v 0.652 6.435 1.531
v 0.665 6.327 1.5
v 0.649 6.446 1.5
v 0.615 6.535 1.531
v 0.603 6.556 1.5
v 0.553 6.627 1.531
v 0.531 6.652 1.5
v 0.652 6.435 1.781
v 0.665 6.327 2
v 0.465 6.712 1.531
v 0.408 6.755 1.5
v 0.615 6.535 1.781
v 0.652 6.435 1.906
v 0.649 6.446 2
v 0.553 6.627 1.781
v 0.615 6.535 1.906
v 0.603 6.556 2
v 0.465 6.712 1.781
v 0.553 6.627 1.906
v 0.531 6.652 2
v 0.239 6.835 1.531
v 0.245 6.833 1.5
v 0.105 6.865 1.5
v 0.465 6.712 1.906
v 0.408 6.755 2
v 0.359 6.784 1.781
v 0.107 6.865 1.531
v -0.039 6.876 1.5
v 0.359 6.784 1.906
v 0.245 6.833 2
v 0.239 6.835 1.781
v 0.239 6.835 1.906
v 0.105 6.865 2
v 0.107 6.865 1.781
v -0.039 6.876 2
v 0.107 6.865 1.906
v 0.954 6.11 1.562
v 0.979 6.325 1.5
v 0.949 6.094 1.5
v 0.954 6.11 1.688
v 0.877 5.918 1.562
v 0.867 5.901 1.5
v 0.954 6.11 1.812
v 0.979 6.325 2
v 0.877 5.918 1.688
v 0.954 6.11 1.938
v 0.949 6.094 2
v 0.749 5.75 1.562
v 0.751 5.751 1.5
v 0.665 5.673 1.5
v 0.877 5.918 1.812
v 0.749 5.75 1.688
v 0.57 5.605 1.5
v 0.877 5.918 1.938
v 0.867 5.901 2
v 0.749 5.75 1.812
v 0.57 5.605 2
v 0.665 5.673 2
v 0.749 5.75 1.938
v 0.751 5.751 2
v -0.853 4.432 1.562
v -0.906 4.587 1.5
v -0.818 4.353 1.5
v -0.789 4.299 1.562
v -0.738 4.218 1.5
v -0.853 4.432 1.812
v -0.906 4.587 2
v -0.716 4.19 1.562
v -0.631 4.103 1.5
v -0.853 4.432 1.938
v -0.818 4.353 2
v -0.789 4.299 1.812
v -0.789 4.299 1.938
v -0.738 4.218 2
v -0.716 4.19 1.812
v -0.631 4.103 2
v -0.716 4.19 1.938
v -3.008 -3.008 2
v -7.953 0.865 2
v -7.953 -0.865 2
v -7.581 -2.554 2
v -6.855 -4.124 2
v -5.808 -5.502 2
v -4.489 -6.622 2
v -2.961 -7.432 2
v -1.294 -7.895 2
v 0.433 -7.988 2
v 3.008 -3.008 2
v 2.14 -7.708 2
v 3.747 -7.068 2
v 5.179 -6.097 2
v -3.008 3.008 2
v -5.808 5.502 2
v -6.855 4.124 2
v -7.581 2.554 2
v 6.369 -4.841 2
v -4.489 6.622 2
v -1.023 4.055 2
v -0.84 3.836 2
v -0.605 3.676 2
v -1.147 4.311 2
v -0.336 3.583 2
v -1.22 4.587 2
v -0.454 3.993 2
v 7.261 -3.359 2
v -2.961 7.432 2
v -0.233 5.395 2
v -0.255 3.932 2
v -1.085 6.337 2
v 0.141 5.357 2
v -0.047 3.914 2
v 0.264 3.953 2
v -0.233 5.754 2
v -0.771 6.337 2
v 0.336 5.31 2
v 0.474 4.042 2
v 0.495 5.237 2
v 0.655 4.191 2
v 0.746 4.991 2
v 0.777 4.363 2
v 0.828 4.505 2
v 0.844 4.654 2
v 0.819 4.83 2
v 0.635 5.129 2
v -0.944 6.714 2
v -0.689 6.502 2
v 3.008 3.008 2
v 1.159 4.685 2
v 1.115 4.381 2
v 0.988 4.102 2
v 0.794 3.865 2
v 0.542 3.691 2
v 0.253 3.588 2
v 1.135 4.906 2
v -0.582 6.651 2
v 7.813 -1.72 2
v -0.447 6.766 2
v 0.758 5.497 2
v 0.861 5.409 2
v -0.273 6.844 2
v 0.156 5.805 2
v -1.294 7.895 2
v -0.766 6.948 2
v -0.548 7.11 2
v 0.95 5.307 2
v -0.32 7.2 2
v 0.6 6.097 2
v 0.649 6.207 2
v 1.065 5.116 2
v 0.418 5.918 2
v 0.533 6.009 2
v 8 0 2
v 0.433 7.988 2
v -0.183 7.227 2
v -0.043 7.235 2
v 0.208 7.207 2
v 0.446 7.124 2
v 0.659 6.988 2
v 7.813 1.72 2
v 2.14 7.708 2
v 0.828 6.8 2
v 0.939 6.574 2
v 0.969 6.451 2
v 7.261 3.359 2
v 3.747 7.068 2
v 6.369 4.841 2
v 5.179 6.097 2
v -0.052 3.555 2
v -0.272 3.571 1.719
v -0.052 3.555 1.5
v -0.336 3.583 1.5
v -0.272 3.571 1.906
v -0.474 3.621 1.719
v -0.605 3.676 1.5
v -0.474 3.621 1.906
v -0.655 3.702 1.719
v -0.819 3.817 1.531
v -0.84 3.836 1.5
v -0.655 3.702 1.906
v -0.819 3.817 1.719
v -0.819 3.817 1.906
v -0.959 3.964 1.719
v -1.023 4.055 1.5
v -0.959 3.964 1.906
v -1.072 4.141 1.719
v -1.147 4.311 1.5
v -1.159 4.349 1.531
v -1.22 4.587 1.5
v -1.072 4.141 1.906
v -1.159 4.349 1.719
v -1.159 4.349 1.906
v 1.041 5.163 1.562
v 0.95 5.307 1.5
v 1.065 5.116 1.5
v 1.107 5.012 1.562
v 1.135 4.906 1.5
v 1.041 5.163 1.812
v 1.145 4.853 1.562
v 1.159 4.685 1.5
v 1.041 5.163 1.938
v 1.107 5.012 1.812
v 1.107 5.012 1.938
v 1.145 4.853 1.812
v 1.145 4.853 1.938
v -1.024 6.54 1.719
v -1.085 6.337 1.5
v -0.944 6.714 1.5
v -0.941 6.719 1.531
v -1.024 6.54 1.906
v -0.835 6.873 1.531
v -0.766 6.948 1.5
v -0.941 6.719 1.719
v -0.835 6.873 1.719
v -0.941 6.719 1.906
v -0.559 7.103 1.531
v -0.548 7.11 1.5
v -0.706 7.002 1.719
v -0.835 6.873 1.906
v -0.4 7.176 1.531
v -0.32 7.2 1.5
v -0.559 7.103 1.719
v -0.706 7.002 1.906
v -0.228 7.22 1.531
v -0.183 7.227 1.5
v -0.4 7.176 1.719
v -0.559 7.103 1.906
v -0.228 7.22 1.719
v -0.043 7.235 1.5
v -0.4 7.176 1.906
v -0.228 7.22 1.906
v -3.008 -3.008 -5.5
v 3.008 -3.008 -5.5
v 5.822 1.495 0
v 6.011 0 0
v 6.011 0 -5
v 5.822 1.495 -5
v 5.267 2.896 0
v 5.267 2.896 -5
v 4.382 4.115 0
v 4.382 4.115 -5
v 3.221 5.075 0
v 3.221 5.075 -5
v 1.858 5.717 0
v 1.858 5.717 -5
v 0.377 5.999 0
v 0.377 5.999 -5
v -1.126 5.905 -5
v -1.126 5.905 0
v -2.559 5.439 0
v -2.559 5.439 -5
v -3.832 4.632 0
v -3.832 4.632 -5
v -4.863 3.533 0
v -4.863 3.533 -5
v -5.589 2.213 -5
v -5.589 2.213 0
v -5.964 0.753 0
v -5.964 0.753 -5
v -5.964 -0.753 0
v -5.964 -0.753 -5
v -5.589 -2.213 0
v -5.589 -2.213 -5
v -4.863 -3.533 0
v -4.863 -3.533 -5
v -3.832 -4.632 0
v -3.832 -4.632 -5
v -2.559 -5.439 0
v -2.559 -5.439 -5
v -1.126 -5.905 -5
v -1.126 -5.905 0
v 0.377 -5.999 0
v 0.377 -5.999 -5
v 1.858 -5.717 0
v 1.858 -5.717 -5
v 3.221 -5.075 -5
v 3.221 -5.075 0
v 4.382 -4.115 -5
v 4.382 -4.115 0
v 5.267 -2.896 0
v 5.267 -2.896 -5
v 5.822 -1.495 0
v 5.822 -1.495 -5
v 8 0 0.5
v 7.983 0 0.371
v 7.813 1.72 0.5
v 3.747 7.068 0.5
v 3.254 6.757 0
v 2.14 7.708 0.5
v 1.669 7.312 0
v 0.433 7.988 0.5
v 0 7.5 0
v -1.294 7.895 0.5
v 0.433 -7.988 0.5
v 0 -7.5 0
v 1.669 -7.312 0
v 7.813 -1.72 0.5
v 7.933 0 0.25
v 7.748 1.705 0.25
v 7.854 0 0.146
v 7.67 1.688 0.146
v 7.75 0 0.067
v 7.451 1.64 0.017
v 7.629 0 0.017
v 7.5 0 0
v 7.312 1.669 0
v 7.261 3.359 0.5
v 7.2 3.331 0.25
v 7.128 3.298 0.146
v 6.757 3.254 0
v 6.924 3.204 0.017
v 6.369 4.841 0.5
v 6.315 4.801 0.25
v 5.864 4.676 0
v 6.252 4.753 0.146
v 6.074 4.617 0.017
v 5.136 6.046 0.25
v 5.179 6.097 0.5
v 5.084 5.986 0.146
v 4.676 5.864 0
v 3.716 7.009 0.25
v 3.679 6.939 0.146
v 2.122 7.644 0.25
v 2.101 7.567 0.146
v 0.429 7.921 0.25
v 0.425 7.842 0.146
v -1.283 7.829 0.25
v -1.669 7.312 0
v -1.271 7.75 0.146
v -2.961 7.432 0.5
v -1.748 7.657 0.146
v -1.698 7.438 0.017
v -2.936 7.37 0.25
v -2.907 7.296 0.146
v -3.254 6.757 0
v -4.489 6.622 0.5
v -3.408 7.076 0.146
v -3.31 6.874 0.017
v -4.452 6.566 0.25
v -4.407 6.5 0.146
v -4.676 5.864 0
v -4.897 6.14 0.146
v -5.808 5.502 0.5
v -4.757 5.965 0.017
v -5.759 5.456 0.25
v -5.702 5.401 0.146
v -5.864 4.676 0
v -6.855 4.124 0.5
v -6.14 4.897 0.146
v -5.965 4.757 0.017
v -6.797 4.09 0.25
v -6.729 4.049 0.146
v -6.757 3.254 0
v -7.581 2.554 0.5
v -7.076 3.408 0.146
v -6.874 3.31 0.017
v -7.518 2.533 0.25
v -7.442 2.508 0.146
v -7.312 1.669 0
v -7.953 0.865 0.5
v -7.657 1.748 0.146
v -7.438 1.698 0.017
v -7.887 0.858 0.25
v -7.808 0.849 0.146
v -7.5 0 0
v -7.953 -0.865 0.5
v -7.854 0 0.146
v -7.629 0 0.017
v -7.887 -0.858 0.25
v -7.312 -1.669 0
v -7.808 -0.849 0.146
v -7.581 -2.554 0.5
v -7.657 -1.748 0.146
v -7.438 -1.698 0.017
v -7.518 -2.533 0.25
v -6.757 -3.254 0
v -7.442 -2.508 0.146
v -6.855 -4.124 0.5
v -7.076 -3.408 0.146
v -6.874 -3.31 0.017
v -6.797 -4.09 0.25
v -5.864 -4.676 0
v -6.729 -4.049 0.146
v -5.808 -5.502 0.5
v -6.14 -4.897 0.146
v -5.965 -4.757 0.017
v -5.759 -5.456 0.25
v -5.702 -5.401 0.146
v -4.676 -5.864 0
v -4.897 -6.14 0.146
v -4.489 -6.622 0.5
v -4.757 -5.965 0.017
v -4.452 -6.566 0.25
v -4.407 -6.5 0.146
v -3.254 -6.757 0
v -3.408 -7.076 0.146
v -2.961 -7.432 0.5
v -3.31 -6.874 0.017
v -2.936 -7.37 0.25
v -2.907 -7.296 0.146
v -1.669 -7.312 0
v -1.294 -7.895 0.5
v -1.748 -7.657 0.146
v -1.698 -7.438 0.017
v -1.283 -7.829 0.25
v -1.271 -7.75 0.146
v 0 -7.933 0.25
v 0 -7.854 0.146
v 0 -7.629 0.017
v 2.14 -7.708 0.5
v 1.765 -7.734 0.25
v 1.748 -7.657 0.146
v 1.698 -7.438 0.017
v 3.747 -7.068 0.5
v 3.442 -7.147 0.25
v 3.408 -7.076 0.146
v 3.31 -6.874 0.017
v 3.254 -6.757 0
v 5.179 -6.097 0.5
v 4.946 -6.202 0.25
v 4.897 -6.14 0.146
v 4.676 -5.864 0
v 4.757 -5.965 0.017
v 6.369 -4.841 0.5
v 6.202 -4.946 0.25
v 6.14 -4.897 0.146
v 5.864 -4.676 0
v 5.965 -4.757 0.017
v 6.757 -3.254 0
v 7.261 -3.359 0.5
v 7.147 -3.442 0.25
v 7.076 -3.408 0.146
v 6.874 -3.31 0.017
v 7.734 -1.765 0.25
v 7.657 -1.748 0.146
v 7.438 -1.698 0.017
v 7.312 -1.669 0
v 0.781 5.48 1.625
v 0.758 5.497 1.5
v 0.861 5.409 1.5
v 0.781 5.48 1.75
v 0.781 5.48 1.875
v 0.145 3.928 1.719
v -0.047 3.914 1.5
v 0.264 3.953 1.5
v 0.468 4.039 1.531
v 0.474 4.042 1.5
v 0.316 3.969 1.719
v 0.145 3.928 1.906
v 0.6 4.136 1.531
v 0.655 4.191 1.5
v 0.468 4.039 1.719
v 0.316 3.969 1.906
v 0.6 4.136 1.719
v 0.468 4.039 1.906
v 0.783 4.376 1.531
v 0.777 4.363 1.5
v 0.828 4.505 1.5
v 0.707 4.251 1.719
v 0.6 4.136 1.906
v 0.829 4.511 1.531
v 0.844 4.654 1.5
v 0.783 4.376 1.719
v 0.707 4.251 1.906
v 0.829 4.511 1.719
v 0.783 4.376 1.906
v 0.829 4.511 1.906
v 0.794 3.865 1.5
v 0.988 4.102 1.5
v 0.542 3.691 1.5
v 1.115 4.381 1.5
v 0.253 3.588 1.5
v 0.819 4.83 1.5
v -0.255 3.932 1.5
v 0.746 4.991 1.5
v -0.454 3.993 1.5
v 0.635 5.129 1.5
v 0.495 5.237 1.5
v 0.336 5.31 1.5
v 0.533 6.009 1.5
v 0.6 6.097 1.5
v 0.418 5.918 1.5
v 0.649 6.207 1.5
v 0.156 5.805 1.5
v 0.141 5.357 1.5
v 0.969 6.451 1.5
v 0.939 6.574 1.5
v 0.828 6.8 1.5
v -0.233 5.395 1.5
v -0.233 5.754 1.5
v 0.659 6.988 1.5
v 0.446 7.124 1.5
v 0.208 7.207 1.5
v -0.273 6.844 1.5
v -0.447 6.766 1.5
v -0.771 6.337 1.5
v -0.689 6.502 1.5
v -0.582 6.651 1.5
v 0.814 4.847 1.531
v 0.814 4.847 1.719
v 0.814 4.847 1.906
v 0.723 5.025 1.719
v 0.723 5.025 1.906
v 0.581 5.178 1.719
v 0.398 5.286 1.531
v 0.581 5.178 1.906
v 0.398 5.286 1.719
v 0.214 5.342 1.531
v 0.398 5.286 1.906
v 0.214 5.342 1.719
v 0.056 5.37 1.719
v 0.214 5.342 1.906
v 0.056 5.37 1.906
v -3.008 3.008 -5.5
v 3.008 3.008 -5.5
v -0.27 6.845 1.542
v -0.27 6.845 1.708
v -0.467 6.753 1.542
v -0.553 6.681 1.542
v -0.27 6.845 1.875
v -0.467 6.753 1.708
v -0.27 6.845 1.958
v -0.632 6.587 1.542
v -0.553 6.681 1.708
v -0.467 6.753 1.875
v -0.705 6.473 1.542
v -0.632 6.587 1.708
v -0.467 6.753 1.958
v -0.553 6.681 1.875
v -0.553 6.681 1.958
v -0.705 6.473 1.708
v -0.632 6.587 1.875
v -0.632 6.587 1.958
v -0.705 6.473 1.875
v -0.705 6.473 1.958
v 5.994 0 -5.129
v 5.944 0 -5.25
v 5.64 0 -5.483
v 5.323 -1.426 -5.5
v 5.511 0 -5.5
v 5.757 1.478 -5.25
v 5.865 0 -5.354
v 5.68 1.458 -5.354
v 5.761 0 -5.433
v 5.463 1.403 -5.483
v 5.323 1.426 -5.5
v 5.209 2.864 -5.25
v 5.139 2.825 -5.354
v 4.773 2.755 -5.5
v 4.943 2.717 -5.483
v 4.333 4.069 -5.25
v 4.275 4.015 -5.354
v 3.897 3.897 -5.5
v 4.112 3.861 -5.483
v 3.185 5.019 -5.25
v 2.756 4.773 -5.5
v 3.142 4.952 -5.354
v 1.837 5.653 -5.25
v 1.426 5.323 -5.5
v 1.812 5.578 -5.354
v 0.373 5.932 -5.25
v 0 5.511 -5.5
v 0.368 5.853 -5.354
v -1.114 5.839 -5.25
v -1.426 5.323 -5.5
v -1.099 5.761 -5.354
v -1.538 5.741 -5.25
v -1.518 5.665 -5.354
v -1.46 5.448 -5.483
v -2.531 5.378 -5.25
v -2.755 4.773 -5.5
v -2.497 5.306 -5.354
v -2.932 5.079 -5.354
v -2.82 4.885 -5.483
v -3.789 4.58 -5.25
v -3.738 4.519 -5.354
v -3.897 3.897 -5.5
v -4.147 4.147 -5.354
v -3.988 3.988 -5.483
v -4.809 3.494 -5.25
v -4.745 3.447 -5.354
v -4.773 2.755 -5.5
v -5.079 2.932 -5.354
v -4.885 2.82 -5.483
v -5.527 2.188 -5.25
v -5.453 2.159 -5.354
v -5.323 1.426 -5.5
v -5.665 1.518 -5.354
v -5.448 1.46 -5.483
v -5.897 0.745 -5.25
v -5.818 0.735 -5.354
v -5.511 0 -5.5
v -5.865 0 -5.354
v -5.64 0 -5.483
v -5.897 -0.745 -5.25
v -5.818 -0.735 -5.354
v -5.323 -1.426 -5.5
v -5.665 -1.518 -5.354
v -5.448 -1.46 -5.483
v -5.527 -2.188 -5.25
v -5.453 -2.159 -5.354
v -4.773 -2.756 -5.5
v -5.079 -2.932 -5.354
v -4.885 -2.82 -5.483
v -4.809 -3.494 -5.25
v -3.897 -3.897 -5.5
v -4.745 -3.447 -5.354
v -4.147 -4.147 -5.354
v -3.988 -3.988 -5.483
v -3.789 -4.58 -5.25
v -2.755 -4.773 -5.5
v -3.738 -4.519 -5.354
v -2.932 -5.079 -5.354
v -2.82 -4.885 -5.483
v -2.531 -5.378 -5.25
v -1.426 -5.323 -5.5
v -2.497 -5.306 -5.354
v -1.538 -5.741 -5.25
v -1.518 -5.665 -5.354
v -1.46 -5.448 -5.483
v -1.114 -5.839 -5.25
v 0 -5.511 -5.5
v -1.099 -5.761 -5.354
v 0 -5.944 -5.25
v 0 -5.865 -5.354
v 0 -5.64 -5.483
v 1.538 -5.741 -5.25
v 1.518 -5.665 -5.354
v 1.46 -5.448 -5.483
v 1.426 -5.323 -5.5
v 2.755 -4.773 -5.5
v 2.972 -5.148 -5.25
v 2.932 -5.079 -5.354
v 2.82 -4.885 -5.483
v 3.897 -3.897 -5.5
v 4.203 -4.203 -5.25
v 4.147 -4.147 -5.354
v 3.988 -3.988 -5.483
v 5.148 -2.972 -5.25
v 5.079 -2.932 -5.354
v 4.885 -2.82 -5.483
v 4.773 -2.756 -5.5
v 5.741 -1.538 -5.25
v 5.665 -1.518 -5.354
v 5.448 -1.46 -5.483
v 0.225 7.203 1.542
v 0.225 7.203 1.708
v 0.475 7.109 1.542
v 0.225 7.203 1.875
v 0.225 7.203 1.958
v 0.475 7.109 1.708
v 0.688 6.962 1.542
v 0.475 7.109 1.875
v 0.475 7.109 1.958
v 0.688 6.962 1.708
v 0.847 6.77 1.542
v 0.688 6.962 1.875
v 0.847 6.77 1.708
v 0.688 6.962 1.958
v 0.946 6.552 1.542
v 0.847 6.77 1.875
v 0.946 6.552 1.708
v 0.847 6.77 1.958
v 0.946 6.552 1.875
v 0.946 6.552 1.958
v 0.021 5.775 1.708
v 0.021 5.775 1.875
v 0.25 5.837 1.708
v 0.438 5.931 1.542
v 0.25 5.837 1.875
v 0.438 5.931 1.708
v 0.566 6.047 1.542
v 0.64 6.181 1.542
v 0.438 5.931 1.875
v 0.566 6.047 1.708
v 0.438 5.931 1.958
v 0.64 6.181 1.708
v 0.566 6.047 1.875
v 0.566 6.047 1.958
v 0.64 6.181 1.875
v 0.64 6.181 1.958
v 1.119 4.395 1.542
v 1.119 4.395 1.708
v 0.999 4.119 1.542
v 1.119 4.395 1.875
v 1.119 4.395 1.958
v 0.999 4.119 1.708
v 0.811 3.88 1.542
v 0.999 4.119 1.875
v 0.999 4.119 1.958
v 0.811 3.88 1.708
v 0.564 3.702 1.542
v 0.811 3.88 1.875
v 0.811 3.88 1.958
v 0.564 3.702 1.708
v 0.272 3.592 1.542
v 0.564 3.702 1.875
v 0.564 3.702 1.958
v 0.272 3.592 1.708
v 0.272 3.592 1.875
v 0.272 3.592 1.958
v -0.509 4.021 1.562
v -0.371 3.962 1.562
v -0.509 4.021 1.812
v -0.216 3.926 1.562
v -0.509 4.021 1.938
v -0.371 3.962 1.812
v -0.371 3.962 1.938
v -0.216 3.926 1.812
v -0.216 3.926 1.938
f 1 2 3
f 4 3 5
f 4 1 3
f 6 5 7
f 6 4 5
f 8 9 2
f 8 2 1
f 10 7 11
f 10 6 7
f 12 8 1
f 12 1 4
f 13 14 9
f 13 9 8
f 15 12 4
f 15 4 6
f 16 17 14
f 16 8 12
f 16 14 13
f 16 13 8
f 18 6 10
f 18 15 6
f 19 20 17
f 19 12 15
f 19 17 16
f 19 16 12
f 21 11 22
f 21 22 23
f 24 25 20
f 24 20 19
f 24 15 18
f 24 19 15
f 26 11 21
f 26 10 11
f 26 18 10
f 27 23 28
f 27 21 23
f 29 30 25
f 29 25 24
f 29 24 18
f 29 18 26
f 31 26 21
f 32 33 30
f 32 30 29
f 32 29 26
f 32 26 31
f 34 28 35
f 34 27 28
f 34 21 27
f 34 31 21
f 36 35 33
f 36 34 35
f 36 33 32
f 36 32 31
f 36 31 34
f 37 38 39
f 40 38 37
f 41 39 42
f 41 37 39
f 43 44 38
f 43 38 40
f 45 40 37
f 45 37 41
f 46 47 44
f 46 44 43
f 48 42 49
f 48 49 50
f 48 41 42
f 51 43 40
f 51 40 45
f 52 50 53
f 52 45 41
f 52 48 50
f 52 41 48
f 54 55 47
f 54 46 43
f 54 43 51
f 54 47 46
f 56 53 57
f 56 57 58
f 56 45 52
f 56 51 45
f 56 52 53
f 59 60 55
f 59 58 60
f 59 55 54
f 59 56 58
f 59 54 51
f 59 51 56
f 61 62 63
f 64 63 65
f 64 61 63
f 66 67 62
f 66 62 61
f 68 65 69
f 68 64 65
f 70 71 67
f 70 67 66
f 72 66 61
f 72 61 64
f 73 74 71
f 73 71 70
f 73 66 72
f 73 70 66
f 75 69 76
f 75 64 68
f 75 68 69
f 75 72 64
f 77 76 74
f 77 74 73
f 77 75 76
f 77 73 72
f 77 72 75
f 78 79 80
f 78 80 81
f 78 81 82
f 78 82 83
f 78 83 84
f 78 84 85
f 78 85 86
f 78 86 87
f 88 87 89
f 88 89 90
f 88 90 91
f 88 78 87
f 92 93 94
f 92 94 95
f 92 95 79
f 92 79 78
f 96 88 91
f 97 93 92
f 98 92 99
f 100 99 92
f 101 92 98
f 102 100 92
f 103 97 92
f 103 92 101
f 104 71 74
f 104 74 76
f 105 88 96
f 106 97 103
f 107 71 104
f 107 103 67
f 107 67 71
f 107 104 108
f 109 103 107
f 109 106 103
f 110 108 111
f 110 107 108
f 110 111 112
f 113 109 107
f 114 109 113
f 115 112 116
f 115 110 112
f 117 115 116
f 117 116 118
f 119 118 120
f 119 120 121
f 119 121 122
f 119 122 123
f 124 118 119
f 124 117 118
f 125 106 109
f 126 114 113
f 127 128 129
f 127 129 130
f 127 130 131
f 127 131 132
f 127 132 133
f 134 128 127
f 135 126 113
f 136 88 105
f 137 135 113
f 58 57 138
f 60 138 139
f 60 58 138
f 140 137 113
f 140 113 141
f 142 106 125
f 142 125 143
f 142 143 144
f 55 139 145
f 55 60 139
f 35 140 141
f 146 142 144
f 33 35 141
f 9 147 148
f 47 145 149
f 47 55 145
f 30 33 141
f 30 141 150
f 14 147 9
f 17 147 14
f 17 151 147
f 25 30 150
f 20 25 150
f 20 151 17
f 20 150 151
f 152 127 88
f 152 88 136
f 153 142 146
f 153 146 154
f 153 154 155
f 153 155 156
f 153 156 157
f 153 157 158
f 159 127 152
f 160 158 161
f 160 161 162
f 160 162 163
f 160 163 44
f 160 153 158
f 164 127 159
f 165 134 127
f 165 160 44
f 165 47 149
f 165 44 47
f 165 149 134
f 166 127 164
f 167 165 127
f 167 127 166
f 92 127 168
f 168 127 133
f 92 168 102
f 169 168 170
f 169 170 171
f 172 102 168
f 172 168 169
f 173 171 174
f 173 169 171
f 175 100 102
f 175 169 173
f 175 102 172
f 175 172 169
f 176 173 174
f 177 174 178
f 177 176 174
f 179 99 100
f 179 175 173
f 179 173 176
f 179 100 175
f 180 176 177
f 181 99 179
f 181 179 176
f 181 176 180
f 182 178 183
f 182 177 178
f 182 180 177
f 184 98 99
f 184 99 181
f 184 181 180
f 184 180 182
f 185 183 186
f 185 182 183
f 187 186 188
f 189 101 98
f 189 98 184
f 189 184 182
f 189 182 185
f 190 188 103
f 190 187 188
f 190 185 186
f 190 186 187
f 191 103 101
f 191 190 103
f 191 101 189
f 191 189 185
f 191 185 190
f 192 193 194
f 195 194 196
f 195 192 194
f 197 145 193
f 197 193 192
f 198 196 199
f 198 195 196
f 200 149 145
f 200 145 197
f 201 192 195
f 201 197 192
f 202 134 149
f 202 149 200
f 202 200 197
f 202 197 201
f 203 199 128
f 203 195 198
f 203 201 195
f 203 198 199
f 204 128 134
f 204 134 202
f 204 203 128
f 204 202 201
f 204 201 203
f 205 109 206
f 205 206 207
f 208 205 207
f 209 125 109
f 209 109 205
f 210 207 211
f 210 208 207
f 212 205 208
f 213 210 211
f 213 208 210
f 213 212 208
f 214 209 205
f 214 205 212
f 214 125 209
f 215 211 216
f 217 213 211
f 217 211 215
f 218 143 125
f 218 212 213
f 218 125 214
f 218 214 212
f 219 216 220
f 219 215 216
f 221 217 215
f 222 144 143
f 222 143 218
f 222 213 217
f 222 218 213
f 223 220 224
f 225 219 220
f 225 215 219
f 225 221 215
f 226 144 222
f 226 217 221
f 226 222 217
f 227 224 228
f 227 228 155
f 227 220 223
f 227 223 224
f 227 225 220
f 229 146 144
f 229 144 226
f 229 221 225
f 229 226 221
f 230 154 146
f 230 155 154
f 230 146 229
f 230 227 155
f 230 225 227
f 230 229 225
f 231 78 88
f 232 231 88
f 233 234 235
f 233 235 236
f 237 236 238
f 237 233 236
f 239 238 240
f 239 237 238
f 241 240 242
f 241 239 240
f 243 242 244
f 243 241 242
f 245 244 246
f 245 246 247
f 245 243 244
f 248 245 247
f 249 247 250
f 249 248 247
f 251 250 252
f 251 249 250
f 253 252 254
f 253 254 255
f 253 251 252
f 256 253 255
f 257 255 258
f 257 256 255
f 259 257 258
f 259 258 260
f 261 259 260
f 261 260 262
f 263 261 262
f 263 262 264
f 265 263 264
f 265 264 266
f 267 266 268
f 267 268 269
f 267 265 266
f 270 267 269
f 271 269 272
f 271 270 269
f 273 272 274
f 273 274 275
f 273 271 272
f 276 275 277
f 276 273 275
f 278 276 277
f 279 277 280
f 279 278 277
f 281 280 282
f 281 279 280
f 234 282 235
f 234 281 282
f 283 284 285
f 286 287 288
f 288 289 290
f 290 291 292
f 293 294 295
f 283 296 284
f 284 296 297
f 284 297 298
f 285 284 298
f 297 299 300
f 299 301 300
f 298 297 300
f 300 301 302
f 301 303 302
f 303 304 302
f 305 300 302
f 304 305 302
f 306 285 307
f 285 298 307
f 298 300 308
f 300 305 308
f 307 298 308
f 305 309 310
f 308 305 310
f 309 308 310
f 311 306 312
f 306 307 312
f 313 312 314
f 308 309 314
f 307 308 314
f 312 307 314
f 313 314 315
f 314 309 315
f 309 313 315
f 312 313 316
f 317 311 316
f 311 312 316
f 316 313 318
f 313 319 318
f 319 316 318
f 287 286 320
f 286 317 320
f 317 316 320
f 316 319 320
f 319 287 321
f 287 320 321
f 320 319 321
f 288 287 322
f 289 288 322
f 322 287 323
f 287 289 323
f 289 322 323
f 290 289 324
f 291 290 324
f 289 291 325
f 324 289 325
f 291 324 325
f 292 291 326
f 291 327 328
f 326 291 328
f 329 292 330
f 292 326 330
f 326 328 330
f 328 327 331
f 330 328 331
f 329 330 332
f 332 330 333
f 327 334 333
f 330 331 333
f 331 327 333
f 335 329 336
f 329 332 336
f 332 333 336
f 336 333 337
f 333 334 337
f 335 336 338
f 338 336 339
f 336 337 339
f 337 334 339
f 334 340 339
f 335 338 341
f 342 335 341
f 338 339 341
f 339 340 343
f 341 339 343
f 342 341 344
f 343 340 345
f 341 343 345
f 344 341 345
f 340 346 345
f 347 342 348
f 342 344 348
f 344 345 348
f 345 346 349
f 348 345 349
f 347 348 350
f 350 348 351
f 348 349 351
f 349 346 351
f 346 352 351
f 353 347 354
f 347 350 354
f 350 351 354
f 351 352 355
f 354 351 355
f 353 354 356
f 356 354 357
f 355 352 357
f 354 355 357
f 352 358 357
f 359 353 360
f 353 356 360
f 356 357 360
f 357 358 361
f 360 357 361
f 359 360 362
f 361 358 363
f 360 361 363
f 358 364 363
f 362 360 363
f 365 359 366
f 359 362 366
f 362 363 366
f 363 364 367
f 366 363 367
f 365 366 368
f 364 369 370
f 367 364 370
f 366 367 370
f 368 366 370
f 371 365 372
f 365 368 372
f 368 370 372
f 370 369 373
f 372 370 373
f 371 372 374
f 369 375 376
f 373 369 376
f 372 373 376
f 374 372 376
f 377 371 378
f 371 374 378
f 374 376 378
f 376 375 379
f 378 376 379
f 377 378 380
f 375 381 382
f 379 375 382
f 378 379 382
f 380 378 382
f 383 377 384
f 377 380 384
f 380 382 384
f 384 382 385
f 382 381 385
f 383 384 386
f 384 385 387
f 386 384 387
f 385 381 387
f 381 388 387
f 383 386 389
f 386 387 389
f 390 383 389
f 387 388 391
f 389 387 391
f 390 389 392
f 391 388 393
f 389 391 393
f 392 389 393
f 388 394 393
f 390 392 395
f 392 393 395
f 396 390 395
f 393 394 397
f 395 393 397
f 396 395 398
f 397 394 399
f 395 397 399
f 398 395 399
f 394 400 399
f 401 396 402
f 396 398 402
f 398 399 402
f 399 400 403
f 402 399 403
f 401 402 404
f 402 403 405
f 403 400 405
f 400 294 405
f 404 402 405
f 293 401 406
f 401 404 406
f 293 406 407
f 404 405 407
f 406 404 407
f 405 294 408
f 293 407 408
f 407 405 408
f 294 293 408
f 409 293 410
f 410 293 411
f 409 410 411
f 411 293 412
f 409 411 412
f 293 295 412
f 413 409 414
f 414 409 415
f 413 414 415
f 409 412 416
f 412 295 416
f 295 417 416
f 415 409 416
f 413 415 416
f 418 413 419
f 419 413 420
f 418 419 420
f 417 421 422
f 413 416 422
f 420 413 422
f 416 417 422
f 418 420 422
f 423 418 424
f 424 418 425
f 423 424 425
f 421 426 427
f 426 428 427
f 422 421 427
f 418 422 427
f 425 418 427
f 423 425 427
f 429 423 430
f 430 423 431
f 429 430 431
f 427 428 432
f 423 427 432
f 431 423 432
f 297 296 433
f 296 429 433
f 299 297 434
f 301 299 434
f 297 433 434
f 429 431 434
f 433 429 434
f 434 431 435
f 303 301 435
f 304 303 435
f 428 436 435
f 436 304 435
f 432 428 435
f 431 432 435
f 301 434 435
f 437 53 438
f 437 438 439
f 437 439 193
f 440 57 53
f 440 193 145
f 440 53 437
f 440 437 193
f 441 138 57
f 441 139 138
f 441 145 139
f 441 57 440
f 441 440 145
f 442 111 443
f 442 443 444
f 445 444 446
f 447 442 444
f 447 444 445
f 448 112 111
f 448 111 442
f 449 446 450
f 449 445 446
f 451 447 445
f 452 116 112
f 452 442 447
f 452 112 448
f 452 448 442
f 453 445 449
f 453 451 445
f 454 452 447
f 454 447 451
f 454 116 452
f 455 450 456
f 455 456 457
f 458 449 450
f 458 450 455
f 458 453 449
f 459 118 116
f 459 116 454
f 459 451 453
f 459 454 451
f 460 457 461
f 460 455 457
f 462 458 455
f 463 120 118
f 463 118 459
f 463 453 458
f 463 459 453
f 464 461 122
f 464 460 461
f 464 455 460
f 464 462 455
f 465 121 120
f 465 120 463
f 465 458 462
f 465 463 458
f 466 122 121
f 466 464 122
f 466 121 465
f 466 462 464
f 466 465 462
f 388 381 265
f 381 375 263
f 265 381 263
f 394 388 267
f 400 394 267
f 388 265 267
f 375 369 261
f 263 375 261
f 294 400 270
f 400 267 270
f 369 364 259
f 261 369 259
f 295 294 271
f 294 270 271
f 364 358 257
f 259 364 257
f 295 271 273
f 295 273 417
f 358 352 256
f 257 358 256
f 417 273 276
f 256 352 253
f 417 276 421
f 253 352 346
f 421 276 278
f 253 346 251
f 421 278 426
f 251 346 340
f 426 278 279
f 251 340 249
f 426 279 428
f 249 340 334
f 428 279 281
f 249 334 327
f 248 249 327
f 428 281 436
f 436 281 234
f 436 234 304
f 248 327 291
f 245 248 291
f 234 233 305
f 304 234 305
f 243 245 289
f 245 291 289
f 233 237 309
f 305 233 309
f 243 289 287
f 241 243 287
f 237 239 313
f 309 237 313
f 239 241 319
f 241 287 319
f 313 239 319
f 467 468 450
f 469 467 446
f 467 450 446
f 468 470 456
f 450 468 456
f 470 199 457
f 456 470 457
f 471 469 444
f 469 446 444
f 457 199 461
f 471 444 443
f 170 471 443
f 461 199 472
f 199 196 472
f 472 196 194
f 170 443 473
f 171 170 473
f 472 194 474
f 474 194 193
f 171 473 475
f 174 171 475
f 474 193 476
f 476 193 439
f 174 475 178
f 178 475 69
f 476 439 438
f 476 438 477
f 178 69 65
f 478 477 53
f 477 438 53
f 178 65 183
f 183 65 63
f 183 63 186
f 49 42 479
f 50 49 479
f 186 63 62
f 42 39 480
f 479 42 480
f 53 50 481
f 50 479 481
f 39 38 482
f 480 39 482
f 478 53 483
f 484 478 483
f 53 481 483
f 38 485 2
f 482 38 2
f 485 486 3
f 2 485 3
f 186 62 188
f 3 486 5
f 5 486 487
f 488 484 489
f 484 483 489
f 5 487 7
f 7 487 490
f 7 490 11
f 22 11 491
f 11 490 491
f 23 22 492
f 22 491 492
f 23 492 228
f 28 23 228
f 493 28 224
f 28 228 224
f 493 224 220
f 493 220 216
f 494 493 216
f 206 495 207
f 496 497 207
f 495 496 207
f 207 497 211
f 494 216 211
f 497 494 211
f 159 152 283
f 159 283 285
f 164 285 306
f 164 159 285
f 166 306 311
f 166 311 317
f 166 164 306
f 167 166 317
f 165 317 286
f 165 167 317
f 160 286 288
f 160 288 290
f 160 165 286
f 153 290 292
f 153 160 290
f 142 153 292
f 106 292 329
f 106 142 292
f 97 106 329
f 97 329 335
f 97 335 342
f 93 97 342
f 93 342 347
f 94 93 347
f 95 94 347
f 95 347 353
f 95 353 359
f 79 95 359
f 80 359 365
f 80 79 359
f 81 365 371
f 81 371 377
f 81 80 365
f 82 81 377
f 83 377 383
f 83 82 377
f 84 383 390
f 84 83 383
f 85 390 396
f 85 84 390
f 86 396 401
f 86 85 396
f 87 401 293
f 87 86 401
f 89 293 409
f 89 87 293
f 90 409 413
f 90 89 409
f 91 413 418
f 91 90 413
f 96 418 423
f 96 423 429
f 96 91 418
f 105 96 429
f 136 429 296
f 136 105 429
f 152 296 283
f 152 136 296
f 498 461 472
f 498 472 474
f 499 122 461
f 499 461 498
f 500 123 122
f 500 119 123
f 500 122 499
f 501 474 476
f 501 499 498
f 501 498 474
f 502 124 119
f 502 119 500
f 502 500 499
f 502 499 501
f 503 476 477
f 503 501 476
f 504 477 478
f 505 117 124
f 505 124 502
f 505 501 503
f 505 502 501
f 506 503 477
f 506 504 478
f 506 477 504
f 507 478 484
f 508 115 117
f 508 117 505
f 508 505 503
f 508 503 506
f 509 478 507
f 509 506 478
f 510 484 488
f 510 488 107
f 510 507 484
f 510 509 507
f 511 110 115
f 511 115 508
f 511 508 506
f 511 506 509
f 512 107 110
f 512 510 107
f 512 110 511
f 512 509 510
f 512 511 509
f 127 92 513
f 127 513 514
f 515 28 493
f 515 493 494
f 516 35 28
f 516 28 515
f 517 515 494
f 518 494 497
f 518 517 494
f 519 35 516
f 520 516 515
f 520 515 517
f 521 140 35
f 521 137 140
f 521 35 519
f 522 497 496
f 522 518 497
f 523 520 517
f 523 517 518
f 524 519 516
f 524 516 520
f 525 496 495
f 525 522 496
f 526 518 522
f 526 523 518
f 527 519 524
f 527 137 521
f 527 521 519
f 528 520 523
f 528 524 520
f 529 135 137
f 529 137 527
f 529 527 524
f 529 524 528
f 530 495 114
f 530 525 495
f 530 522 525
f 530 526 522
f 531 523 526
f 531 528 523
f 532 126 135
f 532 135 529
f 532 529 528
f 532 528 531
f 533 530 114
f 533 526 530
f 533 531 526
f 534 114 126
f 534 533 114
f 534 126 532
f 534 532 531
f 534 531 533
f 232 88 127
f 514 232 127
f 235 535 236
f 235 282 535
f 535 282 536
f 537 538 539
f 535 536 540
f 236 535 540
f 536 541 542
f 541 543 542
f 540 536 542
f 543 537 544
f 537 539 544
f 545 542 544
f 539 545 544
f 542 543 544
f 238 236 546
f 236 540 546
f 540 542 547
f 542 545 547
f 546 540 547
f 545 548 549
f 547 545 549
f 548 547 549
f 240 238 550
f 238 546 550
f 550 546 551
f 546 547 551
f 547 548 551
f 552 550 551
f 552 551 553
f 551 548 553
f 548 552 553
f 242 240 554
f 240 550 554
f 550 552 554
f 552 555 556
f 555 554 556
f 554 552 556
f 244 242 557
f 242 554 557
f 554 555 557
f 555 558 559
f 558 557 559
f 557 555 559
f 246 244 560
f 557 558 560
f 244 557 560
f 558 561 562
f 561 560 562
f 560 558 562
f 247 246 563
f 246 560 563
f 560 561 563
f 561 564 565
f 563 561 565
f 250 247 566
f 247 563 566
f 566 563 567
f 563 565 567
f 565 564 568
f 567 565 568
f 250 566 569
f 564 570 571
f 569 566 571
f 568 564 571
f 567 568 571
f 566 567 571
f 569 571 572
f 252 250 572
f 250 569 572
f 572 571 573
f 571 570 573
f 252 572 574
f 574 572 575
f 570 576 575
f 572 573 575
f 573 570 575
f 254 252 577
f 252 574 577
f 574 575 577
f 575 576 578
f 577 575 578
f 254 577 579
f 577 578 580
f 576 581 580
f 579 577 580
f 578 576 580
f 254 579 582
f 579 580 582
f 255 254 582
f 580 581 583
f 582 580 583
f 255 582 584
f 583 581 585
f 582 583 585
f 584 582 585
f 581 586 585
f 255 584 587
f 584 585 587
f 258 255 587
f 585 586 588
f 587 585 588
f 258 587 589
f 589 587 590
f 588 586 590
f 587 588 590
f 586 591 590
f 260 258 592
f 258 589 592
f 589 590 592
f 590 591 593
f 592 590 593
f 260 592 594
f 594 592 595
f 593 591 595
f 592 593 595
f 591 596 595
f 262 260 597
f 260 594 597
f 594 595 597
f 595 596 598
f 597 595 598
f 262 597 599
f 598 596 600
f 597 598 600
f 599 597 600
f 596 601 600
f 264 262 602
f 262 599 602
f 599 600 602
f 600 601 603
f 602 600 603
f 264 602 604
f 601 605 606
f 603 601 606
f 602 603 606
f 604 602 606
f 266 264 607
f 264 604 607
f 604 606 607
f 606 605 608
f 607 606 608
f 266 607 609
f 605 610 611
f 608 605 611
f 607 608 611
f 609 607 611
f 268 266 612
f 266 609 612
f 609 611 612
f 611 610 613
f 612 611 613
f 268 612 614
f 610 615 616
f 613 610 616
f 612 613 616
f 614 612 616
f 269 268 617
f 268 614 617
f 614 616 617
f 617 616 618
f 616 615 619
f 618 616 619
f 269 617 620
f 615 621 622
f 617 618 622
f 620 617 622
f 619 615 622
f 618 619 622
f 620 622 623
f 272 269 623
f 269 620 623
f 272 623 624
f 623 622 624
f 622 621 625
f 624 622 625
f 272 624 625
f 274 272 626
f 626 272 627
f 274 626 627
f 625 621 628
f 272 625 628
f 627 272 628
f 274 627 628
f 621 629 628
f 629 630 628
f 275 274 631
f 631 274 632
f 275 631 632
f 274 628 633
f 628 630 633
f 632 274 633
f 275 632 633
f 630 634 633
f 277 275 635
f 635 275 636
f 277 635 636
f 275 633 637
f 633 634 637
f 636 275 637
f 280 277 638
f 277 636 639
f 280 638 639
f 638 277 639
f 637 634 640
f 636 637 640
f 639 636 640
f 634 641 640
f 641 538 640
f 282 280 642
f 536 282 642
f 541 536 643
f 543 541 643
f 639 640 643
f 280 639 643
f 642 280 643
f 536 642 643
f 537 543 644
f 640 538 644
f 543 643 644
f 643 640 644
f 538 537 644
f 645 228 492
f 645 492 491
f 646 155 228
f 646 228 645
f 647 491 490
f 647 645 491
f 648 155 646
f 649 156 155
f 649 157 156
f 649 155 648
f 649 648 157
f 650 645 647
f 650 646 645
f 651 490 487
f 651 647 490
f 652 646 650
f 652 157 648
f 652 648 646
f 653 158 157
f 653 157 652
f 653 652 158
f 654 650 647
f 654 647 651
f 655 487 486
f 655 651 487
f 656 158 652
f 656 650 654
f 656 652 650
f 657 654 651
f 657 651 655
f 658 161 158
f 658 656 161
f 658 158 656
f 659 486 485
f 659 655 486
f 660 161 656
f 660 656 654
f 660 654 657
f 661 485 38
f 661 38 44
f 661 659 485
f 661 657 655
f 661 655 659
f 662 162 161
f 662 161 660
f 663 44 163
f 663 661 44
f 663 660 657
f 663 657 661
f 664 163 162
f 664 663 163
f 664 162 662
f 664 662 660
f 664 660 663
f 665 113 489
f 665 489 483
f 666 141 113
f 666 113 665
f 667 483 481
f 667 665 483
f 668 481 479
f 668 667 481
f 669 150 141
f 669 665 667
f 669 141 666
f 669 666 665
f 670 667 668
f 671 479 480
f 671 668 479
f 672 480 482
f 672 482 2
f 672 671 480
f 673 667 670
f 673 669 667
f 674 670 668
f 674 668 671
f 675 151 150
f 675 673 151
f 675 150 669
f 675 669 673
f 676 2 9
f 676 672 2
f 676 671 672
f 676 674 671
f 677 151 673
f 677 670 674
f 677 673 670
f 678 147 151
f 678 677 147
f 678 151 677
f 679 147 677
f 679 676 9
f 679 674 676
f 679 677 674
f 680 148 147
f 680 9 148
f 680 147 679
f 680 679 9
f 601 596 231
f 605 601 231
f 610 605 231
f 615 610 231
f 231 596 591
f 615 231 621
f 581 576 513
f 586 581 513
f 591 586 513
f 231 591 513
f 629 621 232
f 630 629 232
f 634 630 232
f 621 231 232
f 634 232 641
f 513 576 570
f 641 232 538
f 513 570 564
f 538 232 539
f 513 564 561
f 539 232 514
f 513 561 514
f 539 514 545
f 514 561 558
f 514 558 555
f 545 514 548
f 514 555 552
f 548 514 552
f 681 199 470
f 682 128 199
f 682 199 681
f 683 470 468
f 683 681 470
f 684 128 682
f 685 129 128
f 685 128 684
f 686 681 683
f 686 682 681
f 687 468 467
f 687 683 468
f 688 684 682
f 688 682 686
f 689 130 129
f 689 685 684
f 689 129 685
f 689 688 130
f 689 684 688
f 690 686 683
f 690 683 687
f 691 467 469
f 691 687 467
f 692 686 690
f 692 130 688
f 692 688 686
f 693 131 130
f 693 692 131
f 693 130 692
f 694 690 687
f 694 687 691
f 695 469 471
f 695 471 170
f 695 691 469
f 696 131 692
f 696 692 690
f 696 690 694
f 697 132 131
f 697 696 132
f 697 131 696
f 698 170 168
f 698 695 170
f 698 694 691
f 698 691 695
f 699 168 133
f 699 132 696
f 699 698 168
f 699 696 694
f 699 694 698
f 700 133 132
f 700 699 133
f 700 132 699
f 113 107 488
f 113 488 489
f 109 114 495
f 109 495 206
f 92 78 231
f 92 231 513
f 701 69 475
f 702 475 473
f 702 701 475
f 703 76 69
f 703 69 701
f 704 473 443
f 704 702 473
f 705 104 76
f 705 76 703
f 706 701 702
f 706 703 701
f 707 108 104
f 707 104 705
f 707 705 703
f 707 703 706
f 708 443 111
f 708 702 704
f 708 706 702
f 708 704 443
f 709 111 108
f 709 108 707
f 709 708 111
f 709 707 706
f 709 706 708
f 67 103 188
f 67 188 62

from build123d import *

# Parameters (mm, degrees)
SKETCH1_R           = 6.011
SKETCH1_W           = 6.016
SKETCH1_H           = 6.016
BOSS_EXTRUDE1_DEPTH = 5.5
SKETCH1_3_R         = 8
SKETCH1_3_W         = 6.016
SKETCH1_3_H         = 6.016
BOSS_EXTRUDE2_DEPTH = 2
FILLET1_R           = 0.5
CUT_EXTRUDE1_DEPTH  = 0.5


with BuildPart() as part:
    # Sketch1 → Boss-Extrude1 (new body)
    with BuildSketch(Plane.XY):
        Circle(SKETCH1_R)
        Rectangle(SKETCH1_W, SKETCH1_H, mode=Mode.SUBTRACT)
    extrude(amount=-BOSS_EXTRUDE1_DEPTH)

    # Sketch1<3> → Boss-Extrude2 (add)
    with BuildSketch(Plane.XY):
        Circle(SKETCH1_3_R)
        Rectangle(SKETCH1_3_W, SKETCH1_3_H, mode=Mode.SUBTRACT)
    extrude(amount=BOSS_EXTRUDE2_DEPTH)

    # Fillet1
    fillet1_edges = [part.edges().sort_by_distance(p)[0] for p in [
        (-8, 0, 0),
        (-6.011, 0, -5.5),
    ]]
    fillet(fillet1_edges, radius=FILLET1_R)

    # Sketch2 → Cut-Extrude1 (cut)
    with BuildSketch(Plane.XY.offset(2)):
        with BuildLine():
            Line((-0.770976701, 6.337168177), (-1.085079266, 6.337168177))
            add(Edge.make_bspline(
                [(-1.085079266, 6.337168177), (-1.076569715, 6.372400661), (-1.059934239, 6.441277286), (-1.025236666, 6.539684546), (-0.987437411, 6.632808068), (-0.942048306, 6.718904141), (-0.892539552, 6.799703044), (-0.83581683, 6.873372169), (-0.774497108, 6.941785134), (-0.706672158, 7.002498372), (-0.635543497, 7.057476101), (-0.560108877, 7.104351158), (-0.481885983, 7.144675311), (-0.40033285, 7.177895543), (-0.315206679, 7.202921067), (-0.227277055, 7.221077872), (-0.136313555, 7.232868986), (-0.074565965, 7.23401975), (-0.043212278, 7.234604075)],
                knots=[0, 0, 0, 0, 1.162005537, 2.271625781, 3.343758855, 4.383309926, 5.390229558, 6.379919256, 7.361854164, 8.333198761, 9.295911338, 10.242430842, 11.177959212, 12.116337295, 13.062827104, 14.020064771, 14.994644689, 16, 16, 16, 16], degree=3))
            add(Edge.make_bspline(
                [(-0.043212278, 7.234604075), (0.002470464, 7.233224844), (0.092839475, 7.230496469), (0.225602522, 7.205582032), (0.353629341, 7.1661569), (0.475518589, 7.111683173), (0.588737021, 7.04449586), (0.689473208, 6.964531123), (0.776361719, 6.873331821), (0.849256096, 6.772599257), (0.906331095, 6.664943748), (0.948417469, 6.554143591), (0.97403915, 6.440461619), (0.977359707, 6.36370434), (0.979023299, 6.325249107)],
                knots=[0, 0, 0, 0, 1.083050992, 2.142477498, 3.193116406, 4.255571735, 5.30263384, 6.308962982, 7.297363603, 8.282367274, 9.249857812, 10.179914175, 11.08814088, 12, 12, 12, 12], degree=3))
            add(Edge.make_bspline(
                [(0.979023299, 6.325249107), (0.977859708, 6.288242312), (0.97558274, 6.215825757), (0.956249035, 6.11010426), (0.923712772, 6.01046266), (0.878643009, 5.916481498), (0.820301459, 5.828756658), (0.749628762, 5.747090767), (0.6661261, 5.671121609), (0.602847162, 5.627602136), (0.570269292, 5.605197023)],
                knots=[0, 0, 0, 0, 1.024540389, 2.004866551, 2.965041327, 3.920577974, 4.882998113, 5.874504559, 6.905732034, 8, 8, 8, 8], degree=3))
            add(Edge.make_bspline(
                [(0.570269292, 5.605197023), (0.607501047, 5.587218852), (0.681267921, 5.551598894), (0.781818451, 5.481743137), (0.873096326, 5.401086789), (0.924000045, 5.338144136), (0.949576183, 5.306519139)],
                knots=[0, 0, 0, 0, 1.015518401, 2.012035669, 3.001164323, 4, 4, 4, 4], degree=3))
            add(Edge.make_bspline(
                [(0.949576183, 5.306519139), (0.966417526, 5.283461387), (0.999824422, 5.237723471), (1.041059955, 5.164187045), (1.07846907, 5.089835555), (1.107619289, 5.012676149), (1.130193156, 4.933603136), (1.146329188, 4.85248074), (1.156353329, 4.769242717), (1.157788881, 4.712930237), (1.158510478, 4.684624107)],
                knots=[0, 0, 0, 0, 1.025084078, 2.033381695, 3.024893161, 4.013698104, 4.991890475, 5.976764909, 6.982997093, 8, 8, 8, 8], degree=3))
            add(Edge.make_bspline(
                [(1.158510478, 4.684624107), (1.156715965, 4.635614385), (1.153135383, 4.537825584), (1.121131308, 4.393350862), (1.071518068, 4.25212536), (1.001061132, 4.11705052), (0.915193623, 3.990670139), (0.813036299, 3.87759383), (0.69574989, 3.780395226), (0.564944241, 3.699184998), (0.423227113, 3.634267076), (0.271651521, 3.589209633), (0.112401467, 3.559863633), (0.003194169, 3.556716764), (-0.052326862, 3.555116895)],
                knots=[0, 0, 0, 0, 0.955779014, 1.907060117, 2.875433937, 3.871313158, 4.872415639, 5.851225146, 6.836215519, 7.83643374, 8.849228613, 9.86973379, 10.916971861, 12, 12, 12, 12], degree=3))
            add(Edge.make_bspline(
                [(-0.052326862, 3.555116895), (-0.089746162, 3.555985108), (-0.163374867, 3.557693463), (-0.271618365, 3.569372064), (-0.374940065, 3.590702069), (-0.473479663, 3.619405374), (-0.567324699, 3.655797116), (-0.656188804, 3.701115814), (-0.740618698, 3.754427316), (-0.819817649, 3.816360904), (-0.893776217, 3.885642244), (-0.960528941, 3.963501254), (-1.021188734, 4.048498658), (-1.074131372, 4.141621714), (-1.121768325, 4.241666971), (-1.160949282, 4.34991547), (-1.19543485, 4.465399492), (-1.211468315, 4.545877232), (-1.21969465, 4.587168177)],
                knots=[0, 0, 0, 0, 1.048658725, 2.063410685, 3.046034179, 4.001477787, 4.936774919, 5.862367409, 6.792675028, 7.730719943, 8.675894397, 9.627829632, 10.600096036, 11.597688215, 12.626045268, 13.701542398, 14.82072376, 16, 16, 16, 16], degree=3))
            Line((-1.21969465, 4.587168177), (-0.905592086, 4.587168177))
            add(Edge.make_bspline(
                [(-0.905592086, 4.587168177), (-0.897408795, 4.560219164), (-0.881491582, 4.507800992), (-0.854397284, 4.432360687), (-0.823529012, 4.363202633), (-0.790414453, 4.299819511), (-0.755636007, 4.241587109), (-0.716721082, 4.19004524), (-0.676551937, 4.142930038), (-0.646272584, 4.116385426), (-0.631453464, 4.103394139)],
                knots=[0, 0, 0, 0, 1.198163088, 2.33053128, 3.407730985, 4.417276592, 5.372219308, 6.28897303, 7.162600585, 8, 8, 8, 8], degree=3))
            add(Edge.make_bspline(
                [(-0.631453464, 4.103394139), (-0.611856888, 4.088285805), (-0.572724225, 4.058115773), (-0.508955994, 4.019614144), (-0.441891108, 3.986253119), (-0.370076433, 3.960769423), (-0.295061663, 3.939191763), (-0.215634298, 3.925071244), (-0.132495081, 3.915383072), (-0.075727317, 3.914528141), (-0.046717887, 3.914091254)],
                knots=[0, 0, 0, 0, 0.946170439, 1.889420265, 2.845303464, 3.807233317, 4.801018734, 5.828864929, 6.890507805, 8, 8, 8, 8], degree=3))
            add(Edge.make_bspline(
                [(-0.046717887, 3.914091254), (-0.013964385, 3.914707159), (0.050082262, 3.915911509), (0.143537122, 3.926987216), (0.232444569, 3.943117629), (0.315817495, 3.968030612), (0.394748002, 3.998811463), (0.468129652, 4.037459869), (0.536925758, 4.082804591), (0.600255164, 4.134343749), (0.657200671, 4.190765244), (0.707340184, 4.249778315), (0.749964846, 4.311134145), (0.784348424, 4.375172266), (0.811498974, 4.441627495), (0.829982175, 4.510686324), (0.84283369, 4.58178359), (0.843880302, 4.630112559), (0.844407914, 4.654475869)],
                knots=[0, 0, 0, 0, 1.217147791, 2.380027433, 3.494444702, 4.572153297, 5.609568379, 6.639424714, 7.649109417, 8.668170816, 9.669597737, 10.625200337, 11.543417969, 12.441394052, 13.322311151, 14.205496177, 15.095365482, 16, 16, 16, 16], degree=3))
            add(Edge.make_bspline(
                [(0.844407914, 4.654475869), (0.842877612, 4.687087208), (0.839824624, 4.752147617), (0.816516045, 4.847865191), (0.77817718, 4.940088603), (0.724504669, 5.027244393), (0.65916894, 5.108020295), (0.582804033, 5.180091777), (0.494775805, 5.239561868), (0.413755936, 5.280650525), (0.34199078, 5.3086876), (0.280575395, 5.327362564), (0.211818792, 5.34317622), (0.136552443, 5.357888492), (0.054209226, 5.37040984), (-0.035121212, 5.380851656), (-0.131456973, 5.389206697), (-0.198148139, 5.392937792), (-0.232515163, 5.394860485)],
                knots=[0, 0, 0, 0, 1.07054697, 2.135767047, 3.216561865, 4.33974944, 5.486079747, 6.621378074, 7.775625952, 8.963672916, 9.598146892, 10.304877434, 11.070270905, 11.915000392, 12.823868403, 13.805723172, 14.86925407, 16, 16, 16, 16], degree=3))
            Line((-0.232515163, 5.394860485), (-0.232515163, 5.753834844))
            add(Edge.make_bspline(
                [(-0.232515163, 5.753834844), (-0.189213997, 5.754569648), (-0.104397651, 5.756008948), (0.019496654, 5.773416958), (0.137969966, 5.797497586), (0.248396708, 5.834382778), (0.349045422, 5.877223075), (0.436365024, 5.927075285), (0.509132171, 5.982490034), (0.566993242, 6.044322643), (0.610522471, 6.110637691), (0.642349268, 6.179754348), (0.661149595, 6.252278409), (0.663659262, 6.301773077), (0.664920734, 6.32665135)],
                knots=[0, 0, 0, 0, 1.321986639, 2.589447074, 3.816329219, 5.01088745, 6.139805852, 7.153945165, 8.075214402, 8.924034688, 9.728124013, 10.488707548, 11.240355623, 12, 12, 12, 12], degree=3))
            add(Edge.make_bspline(
                [(0.664920734, 6.32665135), (0.664506324, 6.344929095), (0.663681873, 6.381291802), (0.653284595, 6.434416871), (0.637660554, 6.485917817), (0.616180824, 6.535575627), (0.587430626, 6.583045901), (0.553024639, 6.62873335), (0.512056539, 6.672377129), (0.465111092, 6.713057449), (0.414699287, 6.751826686), (0.359449512, 6.784740323), (0.301027637, 6.812885385), (0.239368982, 6.836094887), (0.174273452, 6.853554175), (0.106046894, 6.866090017), (0.034559211, 6.873927671), (-0.014212521, 6.875056087), (-0.039005548, 6.875629716)],
                knots=[0, 0, 0, 0, 0.884392785, 1.759457502, 2.611959086, 3.489218968, 4.37281399, 5.2945488, 6.255912374, 7.266815255, 8.301784654, 9.332968512, 10.37626691, 11.440494194, 12.520033166, 13.637162961, 14.798855837, 16, 16, 16, 16], degree=3))
            add(Edge.make_bspline(
                [(-0.039005548, 6.875629716), (-0.078857216, 6.874238354), (-0.156696792, 6.8715207), (-0.268911709, 6.847717687), (-0.373231043, 6.809739603), (-0.452969709, 6.764406584), (-0.511852284, 6.71965615), (-0.553929222, 6.680573763), (-0.595249732, 6.63714094), (-0.633095409, 6.586682564), (-0.671369386, 6.532615774), (-0.706213947, 6.472192093), (-0.74007364, 6.406987698), (-0.760476189, 6.360892064), (-0.770976701, 6.337168177)],
                knots=[0, 0, 0, 0, 1.472543308, 2.876219568, 4.221790263, 5.565193594, 6.249813518, 6.953379497, 7.687249741, 8.463570142, 9.283606569, 10.136032583, 11.040678096, 12, 12, 12, 12], degree=3))
        make_face()
    extrude(amount=-CUT_EXTRUDE1_DEPTH, mode=Mode.SUBTRACT)


solid = part.part
